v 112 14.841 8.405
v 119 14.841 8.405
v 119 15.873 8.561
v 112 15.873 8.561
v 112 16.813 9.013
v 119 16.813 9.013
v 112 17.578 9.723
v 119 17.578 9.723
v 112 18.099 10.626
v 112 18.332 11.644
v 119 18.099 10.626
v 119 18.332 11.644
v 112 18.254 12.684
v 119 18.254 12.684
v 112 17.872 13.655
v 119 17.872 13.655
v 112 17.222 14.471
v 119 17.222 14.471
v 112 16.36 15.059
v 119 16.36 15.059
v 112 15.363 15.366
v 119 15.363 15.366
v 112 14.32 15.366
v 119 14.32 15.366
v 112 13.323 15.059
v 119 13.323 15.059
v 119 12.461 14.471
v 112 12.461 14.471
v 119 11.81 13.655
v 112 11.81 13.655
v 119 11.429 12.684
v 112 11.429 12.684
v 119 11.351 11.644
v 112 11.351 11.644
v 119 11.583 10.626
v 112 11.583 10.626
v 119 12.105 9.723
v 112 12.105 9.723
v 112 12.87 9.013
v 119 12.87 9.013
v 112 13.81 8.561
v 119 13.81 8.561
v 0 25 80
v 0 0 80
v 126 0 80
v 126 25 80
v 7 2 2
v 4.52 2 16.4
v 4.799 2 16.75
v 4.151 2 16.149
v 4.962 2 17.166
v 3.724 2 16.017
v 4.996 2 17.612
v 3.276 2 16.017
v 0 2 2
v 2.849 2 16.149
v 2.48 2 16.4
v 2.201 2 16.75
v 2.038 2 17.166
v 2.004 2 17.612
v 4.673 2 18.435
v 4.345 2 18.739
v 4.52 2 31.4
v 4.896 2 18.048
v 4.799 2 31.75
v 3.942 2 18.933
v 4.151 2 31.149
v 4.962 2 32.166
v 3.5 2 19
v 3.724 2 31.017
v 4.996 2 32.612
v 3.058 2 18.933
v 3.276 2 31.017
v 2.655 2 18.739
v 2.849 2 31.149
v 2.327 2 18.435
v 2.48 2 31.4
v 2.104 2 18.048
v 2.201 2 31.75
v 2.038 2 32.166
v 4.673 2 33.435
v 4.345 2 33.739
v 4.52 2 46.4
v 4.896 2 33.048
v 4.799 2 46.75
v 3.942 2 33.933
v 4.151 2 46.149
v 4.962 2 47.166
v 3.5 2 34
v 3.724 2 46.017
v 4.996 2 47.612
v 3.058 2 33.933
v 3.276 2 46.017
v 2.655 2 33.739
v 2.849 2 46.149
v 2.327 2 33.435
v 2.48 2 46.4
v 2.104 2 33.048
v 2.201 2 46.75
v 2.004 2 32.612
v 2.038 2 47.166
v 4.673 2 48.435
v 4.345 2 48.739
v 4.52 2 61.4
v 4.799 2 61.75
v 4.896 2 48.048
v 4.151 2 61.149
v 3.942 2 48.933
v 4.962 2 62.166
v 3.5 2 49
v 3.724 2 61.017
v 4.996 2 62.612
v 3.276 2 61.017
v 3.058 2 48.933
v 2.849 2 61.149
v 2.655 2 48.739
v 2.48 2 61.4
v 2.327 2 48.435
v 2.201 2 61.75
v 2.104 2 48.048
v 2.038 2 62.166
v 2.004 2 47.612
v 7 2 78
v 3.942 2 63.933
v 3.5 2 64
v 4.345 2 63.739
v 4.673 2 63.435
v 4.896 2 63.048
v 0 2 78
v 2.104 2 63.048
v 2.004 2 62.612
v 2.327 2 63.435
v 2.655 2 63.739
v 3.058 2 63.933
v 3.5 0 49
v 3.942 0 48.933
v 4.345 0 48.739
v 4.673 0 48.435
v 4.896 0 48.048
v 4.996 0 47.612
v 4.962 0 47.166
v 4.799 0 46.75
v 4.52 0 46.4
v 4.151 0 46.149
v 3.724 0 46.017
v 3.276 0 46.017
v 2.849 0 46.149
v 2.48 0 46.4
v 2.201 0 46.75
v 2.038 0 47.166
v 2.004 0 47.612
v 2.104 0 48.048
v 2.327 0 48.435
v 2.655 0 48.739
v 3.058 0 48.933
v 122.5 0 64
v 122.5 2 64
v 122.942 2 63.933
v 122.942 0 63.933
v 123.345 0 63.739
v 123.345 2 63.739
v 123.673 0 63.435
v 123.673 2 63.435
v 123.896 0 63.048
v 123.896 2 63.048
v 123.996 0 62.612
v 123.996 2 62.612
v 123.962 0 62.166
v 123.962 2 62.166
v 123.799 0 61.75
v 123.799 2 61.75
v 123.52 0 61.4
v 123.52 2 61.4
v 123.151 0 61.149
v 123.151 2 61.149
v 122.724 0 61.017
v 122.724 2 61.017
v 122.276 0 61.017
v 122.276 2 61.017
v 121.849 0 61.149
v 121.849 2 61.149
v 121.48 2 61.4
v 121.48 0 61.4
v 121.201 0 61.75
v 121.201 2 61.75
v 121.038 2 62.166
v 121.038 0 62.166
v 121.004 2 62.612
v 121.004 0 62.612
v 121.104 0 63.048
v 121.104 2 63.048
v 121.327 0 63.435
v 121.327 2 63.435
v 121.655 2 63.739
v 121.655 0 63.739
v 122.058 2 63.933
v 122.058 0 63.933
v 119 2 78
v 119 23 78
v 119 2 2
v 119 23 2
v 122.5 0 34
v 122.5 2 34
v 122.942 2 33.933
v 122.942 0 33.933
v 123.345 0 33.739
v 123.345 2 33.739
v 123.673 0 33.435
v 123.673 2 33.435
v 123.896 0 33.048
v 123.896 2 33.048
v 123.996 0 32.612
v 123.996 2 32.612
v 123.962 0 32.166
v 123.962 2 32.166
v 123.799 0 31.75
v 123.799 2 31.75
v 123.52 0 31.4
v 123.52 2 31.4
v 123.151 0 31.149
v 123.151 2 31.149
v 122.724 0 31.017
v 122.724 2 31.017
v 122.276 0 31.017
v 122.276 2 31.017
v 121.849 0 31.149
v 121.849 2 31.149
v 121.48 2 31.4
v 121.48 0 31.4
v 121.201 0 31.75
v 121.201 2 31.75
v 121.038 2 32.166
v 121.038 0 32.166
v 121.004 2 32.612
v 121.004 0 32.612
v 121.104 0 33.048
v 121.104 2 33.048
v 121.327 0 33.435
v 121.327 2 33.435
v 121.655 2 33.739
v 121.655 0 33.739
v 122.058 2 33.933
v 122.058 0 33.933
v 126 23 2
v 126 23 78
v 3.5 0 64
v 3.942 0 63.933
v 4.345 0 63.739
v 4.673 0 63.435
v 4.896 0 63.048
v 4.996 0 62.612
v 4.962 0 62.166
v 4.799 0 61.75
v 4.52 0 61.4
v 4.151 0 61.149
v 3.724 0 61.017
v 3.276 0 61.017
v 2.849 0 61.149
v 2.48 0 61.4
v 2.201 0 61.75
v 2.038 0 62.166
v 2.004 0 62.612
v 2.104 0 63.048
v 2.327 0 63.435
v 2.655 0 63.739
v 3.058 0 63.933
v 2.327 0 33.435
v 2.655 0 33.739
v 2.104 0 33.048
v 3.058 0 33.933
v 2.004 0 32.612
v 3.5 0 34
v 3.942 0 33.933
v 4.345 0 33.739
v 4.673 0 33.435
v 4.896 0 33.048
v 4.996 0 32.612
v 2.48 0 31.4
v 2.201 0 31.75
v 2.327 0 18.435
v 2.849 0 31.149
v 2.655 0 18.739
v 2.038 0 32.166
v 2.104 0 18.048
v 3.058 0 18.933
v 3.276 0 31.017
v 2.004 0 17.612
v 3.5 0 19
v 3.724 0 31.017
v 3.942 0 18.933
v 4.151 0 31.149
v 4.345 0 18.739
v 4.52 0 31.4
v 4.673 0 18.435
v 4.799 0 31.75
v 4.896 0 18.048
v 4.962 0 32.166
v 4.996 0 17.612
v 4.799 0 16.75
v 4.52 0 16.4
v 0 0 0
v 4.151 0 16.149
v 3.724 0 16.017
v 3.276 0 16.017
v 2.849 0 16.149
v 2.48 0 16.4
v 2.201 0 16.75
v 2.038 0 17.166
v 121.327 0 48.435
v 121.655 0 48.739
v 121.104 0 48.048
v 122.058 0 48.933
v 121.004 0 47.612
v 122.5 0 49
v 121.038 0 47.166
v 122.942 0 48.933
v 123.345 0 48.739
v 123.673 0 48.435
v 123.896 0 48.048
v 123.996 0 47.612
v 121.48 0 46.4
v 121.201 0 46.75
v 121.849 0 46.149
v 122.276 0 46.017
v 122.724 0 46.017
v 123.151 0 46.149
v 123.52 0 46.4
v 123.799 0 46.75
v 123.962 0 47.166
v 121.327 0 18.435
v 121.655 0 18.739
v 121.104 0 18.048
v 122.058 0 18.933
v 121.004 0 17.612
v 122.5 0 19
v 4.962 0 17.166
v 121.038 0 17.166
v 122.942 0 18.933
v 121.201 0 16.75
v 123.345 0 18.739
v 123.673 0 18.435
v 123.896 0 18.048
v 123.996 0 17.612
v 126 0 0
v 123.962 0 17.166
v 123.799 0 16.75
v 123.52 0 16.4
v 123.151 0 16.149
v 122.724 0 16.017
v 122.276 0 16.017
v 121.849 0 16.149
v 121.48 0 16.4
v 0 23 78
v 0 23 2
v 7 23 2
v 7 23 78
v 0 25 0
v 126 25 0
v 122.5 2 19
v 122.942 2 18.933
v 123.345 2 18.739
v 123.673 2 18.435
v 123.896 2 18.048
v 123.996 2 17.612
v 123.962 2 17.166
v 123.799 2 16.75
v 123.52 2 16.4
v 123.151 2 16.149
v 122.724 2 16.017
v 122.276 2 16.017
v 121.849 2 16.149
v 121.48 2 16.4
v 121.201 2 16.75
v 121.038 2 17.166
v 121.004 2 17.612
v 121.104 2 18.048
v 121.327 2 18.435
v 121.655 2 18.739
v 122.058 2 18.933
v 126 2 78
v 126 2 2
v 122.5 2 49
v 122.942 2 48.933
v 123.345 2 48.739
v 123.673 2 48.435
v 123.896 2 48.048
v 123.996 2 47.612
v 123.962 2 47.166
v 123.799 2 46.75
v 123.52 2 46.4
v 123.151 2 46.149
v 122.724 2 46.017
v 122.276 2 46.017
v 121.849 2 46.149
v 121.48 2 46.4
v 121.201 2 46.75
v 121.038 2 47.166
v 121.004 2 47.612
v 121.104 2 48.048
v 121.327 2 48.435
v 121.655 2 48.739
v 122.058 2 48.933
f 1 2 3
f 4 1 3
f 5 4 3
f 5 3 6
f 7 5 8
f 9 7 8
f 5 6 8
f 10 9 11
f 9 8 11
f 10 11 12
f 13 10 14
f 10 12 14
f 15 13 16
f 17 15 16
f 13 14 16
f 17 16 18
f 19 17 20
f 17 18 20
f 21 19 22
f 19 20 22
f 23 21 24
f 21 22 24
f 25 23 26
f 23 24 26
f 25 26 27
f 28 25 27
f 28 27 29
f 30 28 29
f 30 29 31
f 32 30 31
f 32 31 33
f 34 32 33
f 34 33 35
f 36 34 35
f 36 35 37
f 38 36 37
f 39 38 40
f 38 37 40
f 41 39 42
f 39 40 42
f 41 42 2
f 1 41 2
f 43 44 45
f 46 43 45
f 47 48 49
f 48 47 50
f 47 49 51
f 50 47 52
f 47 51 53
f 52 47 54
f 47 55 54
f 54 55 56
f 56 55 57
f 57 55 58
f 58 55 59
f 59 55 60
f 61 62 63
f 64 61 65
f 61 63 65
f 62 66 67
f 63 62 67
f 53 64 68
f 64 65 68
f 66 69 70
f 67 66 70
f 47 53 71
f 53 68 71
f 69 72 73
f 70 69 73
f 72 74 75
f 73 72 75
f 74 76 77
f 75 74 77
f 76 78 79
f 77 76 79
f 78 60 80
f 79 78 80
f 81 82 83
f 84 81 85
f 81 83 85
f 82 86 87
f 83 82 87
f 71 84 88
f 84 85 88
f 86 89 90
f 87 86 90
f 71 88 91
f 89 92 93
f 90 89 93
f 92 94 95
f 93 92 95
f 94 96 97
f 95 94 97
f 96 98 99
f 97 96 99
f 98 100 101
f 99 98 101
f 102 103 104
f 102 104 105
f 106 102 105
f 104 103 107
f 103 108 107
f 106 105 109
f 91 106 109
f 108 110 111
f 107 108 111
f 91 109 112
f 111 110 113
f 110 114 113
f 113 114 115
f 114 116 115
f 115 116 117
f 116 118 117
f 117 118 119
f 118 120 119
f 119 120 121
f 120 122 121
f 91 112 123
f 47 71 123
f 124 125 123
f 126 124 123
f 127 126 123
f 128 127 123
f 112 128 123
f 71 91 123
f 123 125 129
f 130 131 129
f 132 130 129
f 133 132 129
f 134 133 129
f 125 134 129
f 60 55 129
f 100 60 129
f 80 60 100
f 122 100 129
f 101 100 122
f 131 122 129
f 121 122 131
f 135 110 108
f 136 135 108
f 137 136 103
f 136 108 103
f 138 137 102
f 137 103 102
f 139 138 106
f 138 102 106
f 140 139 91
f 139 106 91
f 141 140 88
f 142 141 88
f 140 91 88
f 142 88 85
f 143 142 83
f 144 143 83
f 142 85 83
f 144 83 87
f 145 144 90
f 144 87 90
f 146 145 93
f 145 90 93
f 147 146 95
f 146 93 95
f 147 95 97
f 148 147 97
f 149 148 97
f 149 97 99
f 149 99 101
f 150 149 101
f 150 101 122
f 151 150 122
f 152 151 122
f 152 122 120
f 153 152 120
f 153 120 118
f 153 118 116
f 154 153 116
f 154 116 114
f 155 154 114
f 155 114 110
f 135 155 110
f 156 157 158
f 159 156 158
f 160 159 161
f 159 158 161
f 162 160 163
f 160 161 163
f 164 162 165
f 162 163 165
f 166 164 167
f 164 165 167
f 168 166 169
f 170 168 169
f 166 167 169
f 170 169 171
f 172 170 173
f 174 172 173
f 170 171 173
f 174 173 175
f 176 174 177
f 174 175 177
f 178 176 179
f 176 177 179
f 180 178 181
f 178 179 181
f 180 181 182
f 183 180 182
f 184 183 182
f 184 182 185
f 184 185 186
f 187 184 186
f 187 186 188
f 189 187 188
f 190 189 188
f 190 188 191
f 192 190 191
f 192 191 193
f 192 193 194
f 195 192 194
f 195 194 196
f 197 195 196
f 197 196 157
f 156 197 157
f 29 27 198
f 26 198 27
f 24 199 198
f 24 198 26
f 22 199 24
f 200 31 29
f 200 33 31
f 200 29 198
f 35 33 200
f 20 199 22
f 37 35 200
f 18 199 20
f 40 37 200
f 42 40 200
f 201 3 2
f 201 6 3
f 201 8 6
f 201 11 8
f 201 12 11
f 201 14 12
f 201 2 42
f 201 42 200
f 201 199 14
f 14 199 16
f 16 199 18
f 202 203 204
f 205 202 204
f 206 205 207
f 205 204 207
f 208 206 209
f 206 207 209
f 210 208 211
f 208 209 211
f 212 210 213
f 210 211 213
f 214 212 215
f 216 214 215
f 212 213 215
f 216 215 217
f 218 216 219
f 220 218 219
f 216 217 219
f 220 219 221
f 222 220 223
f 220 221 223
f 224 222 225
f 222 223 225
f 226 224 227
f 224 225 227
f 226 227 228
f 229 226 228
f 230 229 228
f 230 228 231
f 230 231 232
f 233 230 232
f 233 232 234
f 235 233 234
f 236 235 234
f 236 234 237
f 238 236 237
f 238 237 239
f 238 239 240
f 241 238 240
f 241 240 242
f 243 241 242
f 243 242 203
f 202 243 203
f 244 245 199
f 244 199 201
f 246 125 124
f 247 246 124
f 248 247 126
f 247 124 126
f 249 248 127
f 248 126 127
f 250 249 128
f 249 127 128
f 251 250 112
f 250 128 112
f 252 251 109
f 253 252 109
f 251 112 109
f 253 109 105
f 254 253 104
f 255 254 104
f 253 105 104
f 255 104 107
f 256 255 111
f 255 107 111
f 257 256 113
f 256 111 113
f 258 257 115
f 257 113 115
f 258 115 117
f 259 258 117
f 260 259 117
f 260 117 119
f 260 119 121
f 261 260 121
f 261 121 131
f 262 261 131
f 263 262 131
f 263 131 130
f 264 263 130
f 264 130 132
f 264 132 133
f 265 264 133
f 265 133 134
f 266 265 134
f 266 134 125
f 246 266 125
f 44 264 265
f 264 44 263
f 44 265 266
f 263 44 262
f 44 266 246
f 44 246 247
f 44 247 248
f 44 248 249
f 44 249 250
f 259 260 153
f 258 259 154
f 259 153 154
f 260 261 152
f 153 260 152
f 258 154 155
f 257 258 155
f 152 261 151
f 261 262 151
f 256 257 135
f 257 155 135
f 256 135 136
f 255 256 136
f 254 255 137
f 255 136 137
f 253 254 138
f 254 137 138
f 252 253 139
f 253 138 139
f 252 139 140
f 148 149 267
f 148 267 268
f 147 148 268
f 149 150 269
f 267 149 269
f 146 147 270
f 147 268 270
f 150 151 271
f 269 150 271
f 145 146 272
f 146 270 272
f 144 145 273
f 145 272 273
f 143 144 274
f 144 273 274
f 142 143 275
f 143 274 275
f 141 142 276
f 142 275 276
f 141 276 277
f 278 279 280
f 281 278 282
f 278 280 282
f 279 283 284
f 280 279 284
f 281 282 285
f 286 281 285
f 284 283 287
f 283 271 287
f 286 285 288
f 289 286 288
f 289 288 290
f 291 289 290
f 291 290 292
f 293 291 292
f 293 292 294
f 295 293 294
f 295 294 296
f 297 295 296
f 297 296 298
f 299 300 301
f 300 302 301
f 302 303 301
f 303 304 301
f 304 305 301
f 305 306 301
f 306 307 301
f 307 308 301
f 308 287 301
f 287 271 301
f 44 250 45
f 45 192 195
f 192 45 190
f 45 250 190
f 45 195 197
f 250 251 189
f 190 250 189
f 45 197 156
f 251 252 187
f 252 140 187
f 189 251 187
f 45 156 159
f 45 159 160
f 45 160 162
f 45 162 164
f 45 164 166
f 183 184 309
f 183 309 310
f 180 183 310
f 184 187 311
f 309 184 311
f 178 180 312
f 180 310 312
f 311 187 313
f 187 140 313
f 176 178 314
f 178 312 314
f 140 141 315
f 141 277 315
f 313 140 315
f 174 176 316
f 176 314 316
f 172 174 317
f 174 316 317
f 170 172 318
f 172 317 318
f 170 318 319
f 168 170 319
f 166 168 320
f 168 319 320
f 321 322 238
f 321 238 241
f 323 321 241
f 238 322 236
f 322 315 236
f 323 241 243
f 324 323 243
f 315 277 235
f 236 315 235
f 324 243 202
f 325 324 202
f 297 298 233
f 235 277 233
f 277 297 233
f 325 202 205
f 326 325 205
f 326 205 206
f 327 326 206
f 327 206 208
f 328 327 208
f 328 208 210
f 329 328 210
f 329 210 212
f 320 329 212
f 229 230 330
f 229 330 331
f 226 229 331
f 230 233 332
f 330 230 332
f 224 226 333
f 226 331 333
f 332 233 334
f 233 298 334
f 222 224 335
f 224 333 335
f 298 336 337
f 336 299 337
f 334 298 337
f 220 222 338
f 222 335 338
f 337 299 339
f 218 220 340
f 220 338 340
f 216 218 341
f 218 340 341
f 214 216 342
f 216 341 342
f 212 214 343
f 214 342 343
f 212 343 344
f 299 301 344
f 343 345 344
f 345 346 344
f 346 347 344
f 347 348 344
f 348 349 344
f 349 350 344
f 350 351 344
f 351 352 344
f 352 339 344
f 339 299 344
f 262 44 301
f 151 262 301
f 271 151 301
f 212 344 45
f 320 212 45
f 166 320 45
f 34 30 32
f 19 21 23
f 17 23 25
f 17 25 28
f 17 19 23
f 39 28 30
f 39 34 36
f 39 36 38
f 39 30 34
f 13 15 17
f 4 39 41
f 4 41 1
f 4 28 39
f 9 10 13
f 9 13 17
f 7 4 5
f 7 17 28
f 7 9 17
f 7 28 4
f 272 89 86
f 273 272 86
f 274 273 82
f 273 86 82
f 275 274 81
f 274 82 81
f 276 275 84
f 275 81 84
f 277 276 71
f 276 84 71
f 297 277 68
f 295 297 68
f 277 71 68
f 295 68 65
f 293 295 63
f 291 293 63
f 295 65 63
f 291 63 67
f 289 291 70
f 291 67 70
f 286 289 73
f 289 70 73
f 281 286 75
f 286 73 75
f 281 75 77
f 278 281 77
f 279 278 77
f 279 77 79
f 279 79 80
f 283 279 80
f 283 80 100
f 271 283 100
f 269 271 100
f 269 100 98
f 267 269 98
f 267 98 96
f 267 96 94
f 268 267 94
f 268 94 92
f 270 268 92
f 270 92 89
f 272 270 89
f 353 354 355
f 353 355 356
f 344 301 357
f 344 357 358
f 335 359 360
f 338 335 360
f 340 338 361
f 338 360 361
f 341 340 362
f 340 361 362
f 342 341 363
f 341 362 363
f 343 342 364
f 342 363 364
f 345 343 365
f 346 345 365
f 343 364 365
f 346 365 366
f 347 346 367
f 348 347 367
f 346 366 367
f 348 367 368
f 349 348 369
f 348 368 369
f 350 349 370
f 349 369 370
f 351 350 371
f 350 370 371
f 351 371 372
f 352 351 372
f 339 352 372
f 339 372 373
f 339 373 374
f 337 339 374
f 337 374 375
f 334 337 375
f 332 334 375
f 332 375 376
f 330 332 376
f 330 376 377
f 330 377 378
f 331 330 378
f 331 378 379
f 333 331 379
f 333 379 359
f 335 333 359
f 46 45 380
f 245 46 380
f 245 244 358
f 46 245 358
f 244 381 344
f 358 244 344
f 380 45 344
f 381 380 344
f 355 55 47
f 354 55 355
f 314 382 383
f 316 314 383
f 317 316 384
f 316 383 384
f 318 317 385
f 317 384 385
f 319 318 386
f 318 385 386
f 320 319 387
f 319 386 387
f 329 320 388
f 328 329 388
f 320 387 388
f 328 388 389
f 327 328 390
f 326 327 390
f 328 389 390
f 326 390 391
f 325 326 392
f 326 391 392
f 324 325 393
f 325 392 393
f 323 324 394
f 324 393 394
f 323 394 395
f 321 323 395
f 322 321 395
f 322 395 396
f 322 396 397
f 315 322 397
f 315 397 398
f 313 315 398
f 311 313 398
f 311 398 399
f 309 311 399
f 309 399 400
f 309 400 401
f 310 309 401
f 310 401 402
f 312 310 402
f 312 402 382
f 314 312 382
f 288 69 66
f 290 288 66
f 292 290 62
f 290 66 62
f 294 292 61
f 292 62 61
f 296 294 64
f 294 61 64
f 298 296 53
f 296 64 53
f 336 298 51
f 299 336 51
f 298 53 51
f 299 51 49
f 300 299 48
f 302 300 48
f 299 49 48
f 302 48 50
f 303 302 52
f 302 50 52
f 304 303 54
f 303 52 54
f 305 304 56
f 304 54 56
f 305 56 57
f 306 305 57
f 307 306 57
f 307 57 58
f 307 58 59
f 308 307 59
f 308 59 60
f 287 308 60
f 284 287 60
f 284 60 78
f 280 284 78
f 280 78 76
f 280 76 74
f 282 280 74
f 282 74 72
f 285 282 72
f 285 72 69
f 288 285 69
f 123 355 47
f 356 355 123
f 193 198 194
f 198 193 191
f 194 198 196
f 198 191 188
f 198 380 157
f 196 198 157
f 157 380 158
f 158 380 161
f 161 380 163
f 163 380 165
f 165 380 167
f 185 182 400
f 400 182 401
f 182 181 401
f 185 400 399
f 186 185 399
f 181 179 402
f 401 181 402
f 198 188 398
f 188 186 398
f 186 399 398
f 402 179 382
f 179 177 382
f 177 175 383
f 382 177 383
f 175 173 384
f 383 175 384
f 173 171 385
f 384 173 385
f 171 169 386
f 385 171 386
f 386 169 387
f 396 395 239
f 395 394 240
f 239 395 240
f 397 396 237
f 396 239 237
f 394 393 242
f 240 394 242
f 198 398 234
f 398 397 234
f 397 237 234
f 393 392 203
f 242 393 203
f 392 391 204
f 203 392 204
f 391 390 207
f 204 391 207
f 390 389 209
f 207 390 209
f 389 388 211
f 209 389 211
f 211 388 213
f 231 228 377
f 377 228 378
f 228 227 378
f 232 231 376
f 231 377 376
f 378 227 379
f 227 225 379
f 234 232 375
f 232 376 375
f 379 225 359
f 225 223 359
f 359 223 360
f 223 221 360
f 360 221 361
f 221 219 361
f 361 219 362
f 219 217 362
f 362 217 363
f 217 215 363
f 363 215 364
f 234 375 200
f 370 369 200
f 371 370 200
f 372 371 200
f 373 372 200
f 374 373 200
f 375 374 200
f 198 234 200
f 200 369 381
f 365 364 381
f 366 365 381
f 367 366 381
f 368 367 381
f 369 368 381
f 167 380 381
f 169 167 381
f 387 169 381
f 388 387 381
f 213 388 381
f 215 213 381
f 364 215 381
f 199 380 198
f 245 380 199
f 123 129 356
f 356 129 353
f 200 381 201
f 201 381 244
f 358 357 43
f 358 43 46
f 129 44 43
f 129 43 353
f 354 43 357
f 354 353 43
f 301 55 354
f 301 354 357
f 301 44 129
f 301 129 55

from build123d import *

# Parameters (mm, degrees)
SKETCH_1_W          = 126
SKETCH_1_H          = 80
EXTRUDE_1_DEPTH     = 25
SKETCH_2_W          = 76
SKETCH_2_H          = 21
CUT_EXTRUDE_1_DEPTH = 7
SKETCH_3_W          = 76
SKETCH_3_H          = 21
CUT_EXTRUDE_2_DEPTH = 7
SKETCH_4_R          = 3.5
CUT_EXTRUDE_3_DEPTH = 7
SKETCH_5_R          = 1.5
CUT_EXTRUDE_5_DEPTH = 23
SKETCH_6_R          = 1.5
CUT_EXTRUDE_6_DEPTH = 23


with BuildPart() as part:
    # 草图1 → 凸台-拉伸1 (new body)
    with BuildSketch(Plane(origin=(0, 0, 0), x_dir=(1, 0, 0), z_dir=(0, 1, 0))):
        with Locations((63, -40)):
            Rectangle(SKETCH_1_W, SKETCH_1_H)
    extrude(amount=EXTRUDE_1_DEPTH)

    # 草图2 → 切除-拉伸1 (cut)
    with BuildSketch(Plane(origin=(126, 0, 0), x_dir=(0, 0, -1), z_dir=(1, 0, 0))):
        with Locations((-40, 12.5)):
            Rectangle(SKETCH_2_W, SKETCH_2_H)
    extrude(amount=-CUT_EXTRUDE_1_DEPTH, mode=Mode.SUBTRACT)

    # 草图3 → 切除-拉伸2 (cut)
    with BuildSketch(Plane.ZY):
        with Locations((40, 12.5)):
            Rectangle(SKETCH_3_W, SKETCH_3_H)
    extrude(amount=-CUT_EXTRUDE_2_DEPTH, mode=Mode.SUBTRACT)

    # 草图4 → 切除-拉伸3 (cut)
    with BuildSketch(Plane(origin=(119, 0, 0), x_dir=(0, 0, -1), z_dir=(1, 0, 0))):
        with Locations((-11.90518779, 14.841361907)):
            Circle(SKETCH_4_R)
    extrude(amount=-CUT_EXTRUDE_3_DEPTH, mode=Mode.SUBTRACT)

    # 草图5 → 切除-拉伸5 (cut)
    with BuildSketch(Plane(origin=(0, 2, 0), x_dir=(1, 0, 0), z_dir=(0, 1, 0))):
        with Locations(Location((122.5, -17.5, 0), (0, 0, 270))):
            Circle(SKETCH_5_R)
        with Locations(Location((122.5, -32.5, 0), (0, 0, 270))):
            Circle(SKETCH_5_R)
        with Locations(Location((122.5, -47.5, 0), (0, 0, 270))):
            Circle(SKETCH_5_R)
        with Locations(Location((122.5, -62.5, 0), (0, 0, 270))):
            Circle(SKETCH_5_R)
    extrude(amount=-CUT_EXTRUDE_5_DEPTH, mode=Mode.SUBTRACT)

    # 草图6 → 切除-拉伸6 (cut)
    with BuildSketch(Plane(origin=(0, 2, 0), x_dir=(1, 0, 0), z_dir=(0, 1, 0))):
        with Locations(Location((3.5, -17.5, 0), (0, 0, 270))):
            Circle(SKETCH_6_R)
        with Locations(Location((3.5, -32.5, 0), (0, 0, 270))):
            Circle(SKETCH_6_R)
        with Locations(Location((3.5, -47.5, 0), (0, 0, 270))):
            Circle(SKETCH_6_R)
        with Locations(Location((3.5, -62.5, 0), (0, 0, 270))):
            Circle(SKETCH_6_R)
    extrude(amount=-CUT_EXTRUDE_6_DEPTH, mode=Mode.SUBTRACT)


solid = part.part
